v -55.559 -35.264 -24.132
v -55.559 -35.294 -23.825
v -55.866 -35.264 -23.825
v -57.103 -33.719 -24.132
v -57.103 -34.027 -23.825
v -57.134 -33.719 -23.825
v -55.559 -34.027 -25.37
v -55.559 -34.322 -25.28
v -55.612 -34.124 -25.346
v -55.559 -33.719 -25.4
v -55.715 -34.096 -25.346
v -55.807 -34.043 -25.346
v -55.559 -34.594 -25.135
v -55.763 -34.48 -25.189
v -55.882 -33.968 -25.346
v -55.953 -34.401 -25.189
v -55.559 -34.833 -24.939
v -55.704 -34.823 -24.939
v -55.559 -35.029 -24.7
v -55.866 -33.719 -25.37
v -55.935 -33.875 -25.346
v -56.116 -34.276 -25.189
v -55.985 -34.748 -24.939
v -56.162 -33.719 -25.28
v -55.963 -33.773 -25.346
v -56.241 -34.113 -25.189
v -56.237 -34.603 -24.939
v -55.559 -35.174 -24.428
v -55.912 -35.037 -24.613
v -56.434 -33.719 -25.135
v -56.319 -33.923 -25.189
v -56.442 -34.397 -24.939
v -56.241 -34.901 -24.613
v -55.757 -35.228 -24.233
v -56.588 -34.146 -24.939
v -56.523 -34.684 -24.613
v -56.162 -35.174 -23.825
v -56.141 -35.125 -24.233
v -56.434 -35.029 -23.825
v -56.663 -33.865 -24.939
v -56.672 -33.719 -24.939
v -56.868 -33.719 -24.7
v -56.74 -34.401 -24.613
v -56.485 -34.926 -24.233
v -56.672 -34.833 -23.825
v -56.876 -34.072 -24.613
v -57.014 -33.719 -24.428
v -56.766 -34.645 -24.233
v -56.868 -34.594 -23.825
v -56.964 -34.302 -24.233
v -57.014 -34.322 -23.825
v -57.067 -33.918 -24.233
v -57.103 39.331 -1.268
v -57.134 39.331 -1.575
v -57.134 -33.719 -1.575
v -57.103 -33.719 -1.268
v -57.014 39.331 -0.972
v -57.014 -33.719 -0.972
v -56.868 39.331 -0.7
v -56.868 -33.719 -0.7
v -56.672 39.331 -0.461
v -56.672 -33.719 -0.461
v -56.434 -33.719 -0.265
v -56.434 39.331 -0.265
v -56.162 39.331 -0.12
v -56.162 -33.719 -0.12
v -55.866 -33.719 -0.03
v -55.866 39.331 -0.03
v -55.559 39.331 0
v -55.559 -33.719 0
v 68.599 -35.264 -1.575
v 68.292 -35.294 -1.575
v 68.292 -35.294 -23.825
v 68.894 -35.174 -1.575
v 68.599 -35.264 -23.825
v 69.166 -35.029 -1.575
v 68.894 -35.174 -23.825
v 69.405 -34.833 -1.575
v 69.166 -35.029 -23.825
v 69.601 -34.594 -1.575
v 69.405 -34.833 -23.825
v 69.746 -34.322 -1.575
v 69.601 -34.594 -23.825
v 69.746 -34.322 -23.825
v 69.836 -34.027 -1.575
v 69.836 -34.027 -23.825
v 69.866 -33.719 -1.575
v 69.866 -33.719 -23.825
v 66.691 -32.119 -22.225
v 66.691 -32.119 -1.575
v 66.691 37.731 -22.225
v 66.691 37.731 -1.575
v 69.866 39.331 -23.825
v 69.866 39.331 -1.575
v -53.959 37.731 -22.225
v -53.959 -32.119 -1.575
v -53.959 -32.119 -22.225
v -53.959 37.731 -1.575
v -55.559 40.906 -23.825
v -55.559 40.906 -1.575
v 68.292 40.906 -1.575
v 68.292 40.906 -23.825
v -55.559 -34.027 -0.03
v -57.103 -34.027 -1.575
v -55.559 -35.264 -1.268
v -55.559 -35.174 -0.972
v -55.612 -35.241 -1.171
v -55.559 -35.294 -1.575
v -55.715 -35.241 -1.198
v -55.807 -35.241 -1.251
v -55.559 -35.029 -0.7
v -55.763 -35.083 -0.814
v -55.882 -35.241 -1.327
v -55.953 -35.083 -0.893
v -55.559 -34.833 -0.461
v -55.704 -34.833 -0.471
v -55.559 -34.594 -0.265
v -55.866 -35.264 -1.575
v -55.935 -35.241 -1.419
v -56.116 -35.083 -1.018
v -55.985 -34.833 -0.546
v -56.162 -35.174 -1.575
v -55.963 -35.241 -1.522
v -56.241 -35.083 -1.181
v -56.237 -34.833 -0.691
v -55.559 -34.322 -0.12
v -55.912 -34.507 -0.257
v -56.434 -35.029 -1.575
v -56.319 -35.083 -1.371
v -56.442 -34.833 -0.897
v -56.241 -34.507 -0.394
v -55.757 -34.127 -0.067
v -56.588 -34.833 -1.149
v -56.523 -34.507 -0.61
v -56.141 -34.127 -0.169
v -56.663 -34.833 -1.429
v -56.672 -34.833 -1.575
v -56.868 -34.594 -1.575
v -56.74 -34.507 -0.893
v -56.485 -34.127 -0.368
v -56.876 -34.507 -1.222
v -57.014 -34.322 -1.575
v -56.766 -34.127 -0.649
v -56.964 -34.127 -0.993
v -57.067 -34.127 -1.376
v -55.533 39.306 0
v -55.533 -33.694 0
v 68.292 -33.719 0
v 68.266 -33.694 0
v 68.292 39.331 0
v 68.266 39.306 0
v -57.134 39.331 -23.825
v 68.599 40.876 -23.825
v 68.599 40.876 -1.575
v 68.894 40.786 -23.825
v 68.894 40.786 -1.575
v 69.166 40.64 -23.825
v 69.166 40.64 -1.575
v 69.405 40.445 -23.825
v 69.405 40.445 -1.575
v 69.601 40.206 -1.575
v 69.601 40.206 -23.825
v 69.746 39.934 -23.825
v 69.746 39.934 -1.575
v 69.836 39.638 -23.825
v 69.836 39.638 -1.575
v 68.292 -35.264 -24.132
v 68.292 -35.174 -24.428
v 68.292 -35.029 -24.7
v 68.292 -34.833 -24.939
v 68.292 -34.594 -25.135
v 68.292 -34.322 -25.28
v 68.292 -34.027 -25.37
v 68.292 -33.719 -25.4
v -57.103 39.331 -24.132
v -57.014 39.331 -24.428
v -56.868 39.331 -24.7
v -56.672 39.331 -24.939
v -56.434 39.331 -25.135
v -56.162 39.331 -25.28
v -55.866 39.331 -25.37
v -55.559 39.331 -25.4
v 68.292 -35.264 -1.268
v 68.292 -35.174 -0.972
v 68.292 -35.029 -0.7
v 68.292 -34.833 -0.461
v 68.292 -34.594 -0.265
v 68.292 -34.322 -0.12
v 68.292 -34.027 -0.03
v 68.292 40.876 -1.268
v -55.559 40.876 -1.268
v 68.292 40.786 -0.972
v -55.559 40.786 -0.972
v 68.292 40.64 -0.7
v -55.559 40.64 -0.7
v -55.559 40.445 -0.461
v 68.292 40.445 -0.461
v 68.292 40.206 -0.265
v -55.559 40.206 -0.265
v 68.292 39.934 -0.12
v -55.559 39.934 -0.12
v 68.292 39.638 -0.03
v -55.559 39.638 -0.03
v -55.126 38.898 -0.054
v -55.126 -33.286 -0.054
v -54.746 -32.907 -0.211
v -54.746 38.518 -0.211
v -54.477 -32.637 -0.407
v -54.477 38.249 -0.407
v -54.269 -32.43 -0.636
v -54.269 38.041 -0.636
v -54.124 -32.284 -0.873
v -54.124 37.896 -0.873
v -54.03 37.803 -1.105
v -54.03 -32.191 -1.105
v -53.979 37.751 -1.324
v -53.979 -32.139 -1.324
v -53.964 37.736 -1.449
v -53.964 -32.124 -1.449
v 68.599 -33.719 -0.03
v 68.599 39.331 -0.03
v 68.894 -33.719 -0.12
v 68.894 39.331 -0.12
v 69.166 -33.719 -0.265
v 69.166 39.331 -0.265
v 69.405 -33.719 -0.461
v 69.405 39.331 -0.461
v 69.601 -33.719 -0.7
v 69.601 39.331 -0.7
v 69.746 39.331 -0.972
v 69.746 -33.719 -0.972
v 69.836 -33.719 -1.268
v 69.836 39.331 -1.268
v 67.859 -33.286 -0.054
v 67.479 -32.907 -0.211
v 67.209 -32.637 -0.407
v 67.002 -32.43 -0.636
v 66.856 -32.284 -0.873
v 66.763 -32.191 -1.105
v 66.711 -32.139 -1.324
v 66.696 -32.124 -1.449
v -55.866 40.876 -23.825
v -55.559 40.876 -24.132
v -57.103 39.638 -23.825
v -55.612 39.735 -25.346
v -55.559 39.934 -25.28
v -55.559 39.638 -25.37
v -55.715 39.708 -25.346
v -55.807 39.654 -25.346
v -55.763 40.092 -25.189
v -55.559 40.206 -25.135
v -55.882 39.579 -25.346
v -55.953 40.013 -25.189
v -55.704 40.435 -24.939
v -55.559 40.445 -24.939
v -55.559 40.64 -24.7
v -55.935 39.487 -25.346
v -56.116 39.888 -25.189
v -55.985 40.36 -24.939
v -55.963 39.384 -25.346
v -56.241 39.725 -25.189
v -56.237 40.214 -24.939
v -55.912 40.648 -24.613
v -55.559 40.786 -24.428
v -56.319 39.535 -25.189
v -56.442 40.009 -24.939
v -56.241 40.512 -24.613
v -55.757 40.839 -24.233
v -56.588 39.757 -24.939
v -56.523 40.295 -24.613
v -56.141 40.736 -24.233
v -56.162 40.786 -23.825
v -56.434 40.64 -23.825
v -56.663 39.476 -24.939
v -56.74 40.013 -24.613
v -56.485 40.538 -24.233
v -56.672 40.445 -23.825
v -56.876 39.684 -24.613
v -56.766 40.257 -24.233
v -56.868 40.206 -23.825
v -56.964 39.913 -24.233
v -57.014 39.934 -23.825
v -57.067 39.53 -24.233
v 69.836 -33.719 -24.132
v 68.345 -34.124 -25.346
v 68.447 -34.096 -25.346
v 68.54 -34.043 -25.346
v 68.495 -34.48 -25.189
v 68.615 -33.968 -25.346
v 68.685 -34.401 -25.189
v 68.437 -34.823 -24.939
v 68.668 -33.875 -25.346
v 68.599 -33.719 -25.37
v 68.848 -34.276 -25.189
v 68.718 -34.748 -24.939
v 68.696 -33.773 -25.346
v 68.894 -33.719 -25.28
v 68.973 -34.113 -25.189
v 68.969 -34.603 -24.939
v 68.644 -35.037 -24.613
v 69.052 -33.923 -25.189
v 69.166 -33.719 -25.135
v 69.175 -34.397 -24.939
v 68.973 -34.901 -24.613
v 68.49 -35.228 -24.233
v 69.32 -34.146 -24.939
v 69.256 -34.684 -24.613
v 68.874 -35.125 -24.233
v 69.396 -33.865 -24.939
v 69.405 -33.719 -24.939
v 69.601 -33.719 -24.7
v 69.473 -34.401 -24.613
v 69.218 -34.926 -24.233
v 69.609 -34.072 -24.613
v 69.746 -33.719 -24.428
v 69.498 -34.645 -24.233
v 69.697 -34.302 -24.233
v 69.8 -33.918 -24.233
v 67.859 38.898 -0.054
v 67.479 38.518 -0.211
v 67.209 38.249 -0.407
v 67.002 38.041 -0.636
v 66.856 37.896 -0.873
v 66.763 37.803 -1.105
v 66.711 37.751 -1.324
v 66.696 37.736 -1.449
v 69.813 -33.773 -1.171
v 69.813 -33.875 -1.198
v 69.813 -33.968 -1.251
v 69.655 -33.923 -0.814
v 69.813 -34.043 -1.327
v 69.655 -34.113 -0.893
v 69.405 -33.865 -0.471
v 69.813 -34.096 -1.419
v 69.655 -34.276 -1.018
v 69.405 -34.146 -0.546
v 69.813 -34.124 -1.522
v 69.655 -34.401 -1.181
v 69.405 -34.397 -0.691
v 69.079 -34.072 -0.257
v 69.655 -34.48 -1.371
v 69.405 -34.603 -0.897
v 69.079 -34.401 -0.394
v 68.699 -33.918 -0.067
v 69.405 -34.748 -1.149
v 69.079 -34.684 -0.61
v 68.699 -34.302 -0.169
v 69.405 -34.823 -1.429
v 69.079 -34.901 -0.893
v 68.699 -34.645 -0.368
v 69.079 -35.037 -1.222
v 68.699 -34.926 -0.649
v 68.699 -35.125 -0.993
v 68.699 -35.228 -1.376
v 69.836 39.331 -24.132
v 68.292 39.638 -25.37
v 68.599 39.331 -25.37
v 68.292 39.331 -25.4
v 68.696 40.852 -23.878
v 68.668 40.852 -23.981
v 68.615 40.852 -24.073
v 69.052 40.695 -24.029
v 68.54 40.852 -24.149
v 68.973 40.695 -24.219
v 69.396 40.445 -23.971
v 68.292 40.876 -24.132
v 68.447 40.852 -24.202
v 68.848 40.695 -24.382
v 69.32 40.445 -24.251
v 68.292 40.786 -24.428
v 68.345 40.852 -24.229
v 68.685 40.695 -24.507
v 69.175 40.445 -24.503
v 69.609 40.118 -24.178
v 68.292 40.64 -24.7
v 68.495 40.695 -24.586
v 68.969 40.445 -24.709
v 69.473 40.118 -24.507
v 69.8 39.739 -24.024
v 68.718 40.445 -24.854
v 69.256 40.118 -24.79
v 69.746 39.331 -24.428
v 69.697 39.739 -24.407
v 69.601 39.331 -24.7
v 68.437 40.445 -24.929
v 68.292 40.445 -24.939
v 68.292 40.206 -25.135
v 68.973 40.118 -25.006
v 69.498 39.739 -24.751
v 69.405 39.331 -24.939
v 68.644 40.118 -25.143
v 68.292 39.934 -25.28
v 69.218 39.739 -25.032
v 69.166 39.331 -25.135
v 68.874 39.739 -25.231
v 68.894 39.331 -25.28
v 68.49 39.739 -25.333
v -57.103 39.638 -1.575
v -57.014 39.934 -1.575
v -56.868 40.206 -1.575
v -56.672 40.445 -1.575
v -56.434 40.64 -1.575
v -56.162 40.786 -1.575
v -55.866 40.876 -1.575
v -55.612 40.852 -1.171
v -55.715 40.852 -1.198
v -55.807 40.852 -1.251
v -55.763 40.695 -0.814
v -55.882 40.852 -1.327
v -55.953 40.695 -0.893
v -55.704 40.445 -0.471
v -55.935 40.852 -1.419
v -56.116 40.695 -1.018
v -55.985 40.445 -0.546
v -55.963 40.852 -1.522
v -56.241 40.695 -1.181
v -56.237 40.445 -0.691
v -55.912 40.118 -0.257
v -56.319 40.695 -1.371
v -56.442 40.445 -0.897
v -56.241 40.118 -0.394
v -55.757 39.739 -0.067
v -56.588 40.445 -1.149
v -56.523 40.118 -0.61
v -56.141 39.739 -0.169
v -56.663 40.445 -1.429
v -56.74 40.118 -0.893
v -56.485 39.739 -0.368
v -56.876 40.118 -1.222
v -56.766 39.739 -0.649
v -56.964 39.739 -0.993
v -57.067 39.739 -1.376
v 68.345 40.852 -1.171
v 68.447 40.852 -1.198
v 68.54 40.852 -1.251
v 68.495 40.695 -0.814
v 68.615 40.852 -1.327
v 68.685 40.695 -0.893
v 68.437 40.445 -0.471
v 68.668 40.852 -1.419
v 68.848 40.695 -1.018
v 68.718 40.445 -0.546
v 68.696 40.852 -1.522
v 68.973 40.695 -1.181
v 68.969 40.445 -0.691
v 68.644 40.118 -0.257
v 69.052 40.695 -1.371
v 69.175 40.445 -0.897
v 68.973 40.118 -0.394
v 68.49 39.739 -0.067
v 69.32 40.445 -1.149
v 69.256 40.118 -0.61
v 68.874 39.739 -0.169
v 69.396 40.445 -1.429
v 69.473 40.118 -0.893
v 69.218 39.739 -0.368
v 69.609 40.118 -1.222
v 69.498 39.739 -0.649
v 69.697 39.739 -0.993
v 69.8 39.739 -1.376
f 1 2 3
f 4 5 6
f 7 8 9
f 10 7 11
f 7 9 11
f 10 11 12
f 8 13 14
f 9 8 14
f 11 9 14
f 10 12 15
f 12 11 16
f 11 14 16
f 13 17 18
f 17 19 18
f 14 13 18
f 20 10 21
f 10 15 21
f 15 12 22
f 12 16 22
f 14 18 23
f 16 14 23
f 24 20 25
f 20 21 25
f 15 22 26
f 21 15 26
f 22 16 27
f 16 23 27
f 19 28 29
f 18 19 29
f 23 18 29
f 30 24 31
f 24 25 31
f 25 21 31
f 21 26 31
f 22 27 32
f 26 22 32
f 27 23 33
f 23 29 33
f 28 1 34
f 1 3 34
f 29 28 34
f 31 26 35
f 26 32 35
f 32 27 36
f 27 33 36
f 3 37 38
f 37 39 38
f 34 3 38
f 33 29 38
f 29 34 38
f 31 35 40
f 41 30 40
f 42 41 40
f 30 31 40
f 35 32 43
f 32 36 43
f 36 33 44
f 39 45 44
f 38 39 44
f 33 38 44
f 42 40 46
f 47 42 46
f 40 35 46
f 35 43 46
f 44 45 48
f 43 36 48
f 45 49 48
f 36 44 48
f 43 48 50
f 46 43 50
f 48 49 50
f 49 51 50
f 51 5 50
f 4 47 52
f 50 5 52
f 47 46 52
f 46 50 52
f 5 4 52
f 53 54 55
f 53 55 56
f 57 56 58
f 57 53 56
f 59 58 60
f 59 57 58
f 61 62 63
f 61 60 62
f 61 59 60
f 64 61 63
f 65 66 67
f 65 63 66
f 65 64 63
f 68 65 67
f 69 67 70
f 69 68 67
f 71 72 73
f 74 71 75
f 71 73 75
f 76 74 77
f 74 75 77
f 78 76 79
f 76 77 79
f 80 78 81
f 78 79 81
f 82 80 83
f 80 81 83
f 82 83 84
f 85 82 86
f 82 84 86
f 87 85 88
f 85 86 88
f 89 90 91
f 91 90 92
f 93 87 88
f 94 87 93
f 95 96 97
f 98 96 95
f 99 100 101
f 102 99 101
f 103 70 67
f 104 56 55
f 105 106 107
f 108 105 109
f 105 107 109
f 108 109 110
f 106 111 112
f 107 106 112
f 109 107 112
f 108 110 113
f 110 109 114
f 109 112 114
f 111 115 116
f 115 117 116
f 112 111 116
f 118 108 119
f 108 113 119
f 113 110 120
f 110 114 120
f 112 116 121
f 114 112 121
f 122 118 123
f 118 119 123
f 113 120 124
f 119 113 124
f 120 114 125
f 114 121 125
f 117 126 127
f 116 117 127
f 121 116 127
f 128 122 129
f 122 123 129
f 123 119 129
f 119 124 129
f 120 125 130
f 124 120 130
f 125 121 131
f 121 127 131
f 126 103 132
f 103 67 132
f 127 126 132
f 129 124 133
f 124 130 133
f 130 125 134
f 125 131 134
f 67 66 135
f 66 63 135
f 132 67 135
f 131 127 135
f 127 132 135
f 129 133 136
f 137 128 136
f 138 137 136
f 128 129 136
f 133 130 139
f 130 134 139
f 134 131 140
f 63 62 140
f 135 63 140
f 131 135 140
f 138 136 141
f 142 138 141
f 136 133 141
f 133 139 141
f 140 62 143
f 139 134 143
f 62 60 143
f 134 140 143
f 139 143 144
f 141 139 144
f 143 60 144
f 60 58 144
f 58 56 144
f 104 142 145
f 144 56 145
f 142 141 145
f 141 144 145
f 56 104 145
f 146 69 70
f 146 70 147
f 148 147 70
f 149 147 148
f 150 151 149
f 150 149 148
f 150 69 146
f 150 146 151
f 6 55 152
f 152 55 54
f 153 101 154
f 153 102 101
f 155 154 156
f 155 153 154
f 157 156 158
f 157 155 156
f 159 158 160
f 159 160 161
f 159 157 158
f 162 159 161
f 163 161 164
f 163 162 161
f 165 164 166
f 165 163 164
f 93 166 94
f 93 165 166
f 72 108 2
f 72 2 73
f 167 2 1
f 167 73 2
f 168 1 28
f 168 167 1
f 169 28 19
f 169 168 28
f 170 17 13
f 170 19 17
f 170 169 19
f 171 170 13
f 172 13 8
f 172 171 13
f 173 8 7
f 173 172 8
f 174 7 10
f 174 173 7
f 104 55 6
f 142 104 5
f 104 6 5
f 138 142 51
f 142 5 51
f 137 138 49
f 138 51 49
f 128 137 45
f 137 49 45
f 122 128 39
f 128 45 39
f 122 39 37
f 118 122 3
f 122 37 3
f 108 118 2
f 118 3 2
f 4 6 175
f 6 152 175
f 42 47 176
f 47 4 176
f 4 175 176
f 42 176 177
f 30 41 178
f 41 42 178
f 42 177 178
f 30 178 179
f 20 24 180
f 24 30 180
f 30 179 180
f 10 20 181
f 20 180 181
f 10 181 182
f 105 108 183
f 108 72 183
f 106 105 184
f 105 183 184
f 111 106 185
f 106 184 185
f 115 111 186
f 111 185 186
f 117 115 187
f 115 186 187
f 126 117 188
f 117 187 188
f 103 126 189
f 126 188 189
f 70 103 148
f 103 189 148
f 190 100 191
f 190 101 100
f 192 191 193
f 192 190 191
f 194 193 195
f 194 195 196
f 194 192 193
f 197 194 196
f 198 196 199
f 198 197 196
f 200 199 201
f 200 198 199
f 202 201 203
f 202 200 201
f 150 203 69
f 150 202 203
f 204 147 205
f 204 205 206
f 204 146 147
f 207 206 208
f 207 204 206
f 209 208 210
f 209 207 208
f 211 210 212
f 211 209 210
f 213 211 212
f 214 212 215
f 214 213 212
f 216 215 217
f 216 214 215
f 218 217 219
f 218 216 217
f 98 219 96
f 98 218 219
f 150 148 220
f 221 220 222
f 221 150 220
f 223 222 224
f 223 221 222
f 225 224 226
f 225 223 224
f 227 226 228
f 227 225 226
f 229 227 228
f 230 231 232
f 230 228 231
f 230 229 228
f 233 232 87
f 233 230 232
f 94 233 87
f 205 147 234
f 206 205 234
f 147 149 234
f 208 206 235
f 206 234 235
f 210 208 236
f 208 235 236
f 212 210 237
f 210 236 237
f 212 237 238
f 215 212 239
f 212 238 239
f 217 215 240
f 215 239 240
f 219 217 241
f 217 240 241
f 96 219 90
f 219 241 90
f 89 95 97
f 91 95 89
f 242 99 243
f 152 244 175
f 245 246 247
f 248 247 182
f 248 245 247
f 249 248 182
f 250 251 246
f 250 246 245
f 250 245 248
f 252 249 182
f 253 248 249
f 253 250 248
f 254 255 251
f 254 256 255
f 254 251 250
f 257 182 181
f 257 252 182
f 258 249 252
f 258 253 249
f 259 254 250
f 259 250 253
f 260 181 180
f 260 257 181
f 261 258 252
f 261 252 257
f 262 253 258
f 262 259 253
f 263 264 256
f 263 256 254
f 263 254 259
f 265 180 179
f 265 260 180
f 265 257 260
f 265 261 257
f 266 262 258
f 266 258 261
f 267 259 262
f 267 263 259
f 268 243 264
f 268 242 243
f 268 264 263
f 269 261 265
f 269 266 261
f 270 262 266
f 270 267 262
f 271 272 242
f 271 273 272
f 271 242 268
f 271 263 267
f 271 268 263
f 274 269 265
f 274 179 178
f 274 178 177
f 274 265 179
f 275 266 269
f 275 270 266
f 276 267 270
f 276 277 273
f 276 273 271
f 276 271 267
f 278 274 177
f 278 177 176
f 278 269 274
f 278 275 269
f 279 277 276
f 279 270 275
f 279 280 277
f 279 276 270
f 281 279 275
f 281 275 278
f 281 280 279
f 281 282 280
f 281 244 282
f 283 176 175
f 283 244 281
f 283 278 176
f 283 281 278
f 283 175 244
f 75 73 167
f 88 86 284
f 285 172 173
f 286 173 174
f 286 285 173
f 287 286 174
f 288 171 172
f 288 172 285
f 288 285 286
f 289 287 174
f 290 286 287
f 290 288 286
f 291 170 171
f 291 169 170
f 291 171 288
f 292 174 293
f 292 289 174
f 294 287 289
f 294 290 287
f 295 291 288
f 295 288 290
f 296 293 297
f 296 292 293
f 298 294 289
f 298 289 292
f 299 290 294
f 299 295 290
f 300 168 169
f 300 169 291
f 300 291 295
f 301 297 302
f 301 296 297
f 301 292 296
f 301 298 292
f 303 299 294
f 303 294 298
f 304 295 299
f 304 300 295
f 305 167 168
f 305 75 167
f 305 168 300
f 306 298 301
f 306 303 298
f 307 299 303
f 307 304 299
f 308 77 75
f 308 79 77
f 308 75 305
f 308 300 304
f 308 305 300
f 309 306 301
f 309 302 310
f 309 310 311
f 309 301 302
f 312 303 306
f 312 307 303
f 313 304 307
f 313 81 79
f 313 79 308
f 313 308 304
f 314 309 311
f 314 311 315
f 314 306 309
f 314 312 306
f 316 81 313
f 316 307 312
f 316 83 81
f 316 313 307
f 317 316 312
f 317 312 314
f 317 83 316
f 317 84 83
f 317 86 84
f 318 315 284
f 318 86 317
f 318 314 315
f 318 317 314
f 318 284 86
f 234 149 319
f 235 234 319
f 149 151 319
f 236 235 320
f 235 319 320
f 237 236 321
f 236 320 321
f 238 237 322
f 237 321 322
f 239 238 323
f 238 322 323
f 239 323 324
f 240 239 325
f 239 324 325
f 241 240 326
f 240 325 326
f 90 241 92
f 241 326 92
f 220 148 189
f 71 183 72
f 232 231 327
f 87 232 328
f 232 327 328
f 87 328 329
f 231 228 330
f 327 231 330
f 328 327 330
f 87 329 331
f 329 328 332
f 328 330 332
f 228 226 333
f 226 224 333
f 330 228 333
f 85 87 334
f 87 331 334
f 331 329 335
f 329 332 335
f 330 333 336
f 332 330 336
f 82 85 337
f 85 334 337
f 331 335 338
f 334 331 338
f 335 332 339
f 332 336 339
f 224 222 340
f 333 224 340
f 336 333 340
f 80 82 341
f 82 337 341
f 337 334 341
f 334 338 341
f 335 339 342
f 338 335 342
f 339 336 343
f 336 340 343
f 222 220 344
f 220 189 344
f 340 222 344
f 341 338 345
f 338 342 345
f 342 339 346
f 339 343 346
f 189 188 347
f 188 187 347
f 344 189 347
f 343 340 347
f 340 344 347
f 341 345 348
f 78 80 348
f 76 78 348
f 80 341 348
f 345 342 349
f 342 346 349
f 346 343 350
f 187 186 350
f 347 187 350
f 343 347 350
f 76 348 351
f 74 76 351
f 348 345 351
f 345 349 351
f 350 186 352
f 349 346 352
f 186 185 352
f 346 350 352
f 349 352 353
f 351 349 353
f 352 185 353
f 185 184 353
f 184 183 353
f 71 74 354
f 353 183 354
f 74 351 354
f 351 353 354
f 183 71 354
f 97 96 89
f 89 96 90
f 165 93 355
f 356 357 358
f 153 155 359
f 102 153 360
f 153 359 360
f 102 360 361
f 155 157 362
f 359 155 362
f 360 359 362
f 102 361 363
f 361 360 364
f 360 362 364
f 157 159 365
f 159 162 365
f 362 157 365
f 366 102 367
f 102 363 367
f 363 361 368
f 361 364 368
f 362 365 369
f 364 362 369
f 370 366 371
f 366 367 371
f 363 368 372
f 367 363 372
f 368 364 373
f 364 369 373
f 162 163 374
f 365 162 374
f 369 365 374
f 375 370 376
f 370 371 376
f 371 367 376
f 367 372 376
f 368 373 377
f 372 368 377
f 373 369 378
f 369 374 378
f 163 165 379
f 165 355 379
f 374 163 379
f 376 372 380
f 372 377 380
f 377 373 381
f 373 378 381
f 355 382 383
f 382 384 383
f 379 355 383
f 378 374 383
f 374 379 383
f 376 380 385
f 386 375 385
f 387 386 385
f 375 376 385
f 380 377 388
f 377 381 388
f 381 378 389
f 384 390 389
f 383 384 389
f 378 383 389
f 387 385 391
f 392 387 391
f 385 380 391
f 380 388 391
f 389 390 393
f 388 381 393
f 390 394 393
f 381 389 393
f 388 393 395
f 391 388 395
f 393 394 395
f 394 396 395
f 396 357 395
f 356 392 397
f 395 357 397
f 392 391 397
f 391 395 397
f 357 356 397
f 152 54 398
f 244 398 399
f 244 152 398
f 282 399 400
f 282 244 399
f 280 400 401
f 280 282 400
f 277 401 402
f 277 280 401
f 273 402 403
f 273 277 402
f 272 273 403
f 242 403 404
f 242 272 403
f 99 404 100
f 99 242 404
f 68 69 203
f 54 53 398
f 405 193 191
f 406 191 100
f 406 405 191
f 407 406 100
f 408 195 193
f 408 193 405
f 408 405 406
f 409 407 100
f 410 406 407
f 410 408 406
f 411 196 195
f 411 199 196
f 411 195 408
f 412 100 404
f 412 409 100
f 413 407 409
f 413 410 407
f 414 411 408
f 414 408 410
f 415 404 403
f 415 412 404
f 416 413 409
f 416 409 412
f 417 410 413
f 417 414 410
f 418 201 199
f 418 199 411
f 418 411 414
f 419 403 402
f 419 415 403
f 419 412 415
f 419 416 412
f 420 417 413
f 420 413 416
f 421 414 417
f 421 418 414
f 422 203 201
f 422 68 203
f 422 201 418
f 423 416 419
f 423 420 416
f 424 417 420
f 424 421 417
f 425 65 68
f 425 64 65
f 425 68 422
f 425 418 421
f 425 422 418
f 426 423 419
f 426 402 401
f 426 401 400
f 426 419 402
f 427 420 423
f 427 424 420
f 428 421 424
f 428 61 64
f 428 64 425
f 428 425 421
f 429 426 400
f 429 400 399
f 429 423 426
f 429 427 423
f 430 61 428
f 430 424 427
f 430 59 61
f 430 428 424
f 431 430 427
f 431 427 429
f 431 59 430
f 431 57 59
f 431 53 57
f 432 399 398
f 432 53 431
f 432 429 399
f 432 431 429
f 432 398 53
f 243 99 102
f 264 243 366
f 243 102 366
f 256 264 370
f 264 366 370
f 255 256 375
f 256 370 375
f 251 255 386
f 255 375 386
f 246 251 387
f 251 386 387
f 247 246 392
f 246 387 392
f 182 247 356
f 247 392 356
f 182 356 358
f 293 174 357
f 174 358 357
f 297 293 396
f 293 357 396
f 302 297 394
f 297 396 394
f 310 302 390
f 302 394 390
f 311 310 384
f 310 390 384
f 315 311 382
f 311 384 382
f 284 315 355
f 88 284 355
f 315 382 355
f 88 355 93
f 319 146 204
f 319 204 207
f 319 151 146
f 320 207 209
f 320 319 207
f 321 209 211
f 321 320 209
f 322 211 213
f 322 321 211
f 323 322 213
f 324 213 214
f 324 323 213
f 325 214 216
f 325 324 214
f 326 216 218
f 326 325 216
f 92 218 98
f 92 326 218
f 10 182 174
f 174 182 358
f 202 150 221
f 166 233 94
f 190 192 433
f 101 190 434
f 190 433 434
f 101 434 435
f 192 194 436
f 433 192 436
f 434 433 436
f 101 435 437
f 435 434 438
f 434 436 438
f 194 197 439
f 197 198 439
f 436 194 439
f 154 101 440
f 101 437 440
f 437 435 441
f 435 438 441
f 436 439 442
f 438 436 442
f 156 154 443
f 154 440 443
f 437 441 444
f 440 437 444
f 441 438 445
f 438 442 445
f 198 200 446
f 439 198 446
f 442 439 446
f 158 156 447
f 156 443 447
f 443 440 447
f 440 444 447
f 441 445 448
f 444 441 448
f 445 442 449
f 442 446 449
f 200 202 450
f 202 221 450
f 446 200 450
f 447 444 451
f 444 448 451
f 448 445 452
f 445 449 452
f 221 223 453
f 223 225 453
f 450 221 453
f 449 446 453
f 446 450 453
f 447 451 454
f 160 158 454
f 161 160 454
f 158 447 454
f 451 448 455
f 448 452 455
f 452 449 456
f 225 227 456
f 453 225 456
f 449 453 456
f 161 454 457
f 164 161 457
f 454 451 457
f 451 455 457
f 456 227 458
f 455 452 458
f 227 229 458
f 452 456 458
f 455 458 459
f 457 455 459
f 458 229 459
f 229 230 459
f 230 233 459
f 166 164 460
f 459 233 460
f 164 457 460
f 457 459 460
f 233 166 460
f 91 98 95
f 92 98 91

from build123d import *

# Parameters (mm, degrees)
F0_W     = 127
F0_H     = 76.2
F1_DEPTH = 25.4
F2_W     = 120.65
F2_H     = 69.85
F3_DEPTH = 22.225
F4_R     = 1.5748


with BuildPart() as f1:
    # F0 (on Top) → F1 (new body)
    with BuildSketch(Plane.XY):
        with Locations((6.366314, 2.805781)):
            Rectangle(F0_W, F0_H)
    extrude(amount=-F1_DEPTH)

    # F2 (on face) → F3 (cut)
    with BuildSketch(Plane.XY):
        with Locations((6.366314, 2.805781)):
            Rectangle(F2_W, F2_H)
    extrude(amount=-F3_DEPTH, mode=Mode.SUBTRACT)

    # F4
    f4_edges = [f1.edges().sort_by_distance(p)[0] for p in [
        (-57.133686, 2.805781, 0),
        (6.366314, -35.294219, 0),
        (69.866314, 2.805781, 0),
        (6.366314, 40.905781, 0),
        (6.366314, 37.730781, 0),
        (-53.958686, 2.805781, 0),
        (6.366314, -32.119219, 0),
        (66.691314, 2.805781, 0),
        (69.866314, -35.294219, -12.7),
        (-57.133686, -35.294219, -12.7),
        (6.366314, -35.294219, -25.4),
        (69.866314, 2.805781, -25.4),
        (69.866314, 40.905781, -12.7),
        (-57.133686, 40.905781, -12.7),
        (6.366314, 40.905781, -25.4),
        (-57.133686, 2.805781, -25.4),
    ]]
    fillet(f4_edges, radius=F4_R)


solid = f1.part
